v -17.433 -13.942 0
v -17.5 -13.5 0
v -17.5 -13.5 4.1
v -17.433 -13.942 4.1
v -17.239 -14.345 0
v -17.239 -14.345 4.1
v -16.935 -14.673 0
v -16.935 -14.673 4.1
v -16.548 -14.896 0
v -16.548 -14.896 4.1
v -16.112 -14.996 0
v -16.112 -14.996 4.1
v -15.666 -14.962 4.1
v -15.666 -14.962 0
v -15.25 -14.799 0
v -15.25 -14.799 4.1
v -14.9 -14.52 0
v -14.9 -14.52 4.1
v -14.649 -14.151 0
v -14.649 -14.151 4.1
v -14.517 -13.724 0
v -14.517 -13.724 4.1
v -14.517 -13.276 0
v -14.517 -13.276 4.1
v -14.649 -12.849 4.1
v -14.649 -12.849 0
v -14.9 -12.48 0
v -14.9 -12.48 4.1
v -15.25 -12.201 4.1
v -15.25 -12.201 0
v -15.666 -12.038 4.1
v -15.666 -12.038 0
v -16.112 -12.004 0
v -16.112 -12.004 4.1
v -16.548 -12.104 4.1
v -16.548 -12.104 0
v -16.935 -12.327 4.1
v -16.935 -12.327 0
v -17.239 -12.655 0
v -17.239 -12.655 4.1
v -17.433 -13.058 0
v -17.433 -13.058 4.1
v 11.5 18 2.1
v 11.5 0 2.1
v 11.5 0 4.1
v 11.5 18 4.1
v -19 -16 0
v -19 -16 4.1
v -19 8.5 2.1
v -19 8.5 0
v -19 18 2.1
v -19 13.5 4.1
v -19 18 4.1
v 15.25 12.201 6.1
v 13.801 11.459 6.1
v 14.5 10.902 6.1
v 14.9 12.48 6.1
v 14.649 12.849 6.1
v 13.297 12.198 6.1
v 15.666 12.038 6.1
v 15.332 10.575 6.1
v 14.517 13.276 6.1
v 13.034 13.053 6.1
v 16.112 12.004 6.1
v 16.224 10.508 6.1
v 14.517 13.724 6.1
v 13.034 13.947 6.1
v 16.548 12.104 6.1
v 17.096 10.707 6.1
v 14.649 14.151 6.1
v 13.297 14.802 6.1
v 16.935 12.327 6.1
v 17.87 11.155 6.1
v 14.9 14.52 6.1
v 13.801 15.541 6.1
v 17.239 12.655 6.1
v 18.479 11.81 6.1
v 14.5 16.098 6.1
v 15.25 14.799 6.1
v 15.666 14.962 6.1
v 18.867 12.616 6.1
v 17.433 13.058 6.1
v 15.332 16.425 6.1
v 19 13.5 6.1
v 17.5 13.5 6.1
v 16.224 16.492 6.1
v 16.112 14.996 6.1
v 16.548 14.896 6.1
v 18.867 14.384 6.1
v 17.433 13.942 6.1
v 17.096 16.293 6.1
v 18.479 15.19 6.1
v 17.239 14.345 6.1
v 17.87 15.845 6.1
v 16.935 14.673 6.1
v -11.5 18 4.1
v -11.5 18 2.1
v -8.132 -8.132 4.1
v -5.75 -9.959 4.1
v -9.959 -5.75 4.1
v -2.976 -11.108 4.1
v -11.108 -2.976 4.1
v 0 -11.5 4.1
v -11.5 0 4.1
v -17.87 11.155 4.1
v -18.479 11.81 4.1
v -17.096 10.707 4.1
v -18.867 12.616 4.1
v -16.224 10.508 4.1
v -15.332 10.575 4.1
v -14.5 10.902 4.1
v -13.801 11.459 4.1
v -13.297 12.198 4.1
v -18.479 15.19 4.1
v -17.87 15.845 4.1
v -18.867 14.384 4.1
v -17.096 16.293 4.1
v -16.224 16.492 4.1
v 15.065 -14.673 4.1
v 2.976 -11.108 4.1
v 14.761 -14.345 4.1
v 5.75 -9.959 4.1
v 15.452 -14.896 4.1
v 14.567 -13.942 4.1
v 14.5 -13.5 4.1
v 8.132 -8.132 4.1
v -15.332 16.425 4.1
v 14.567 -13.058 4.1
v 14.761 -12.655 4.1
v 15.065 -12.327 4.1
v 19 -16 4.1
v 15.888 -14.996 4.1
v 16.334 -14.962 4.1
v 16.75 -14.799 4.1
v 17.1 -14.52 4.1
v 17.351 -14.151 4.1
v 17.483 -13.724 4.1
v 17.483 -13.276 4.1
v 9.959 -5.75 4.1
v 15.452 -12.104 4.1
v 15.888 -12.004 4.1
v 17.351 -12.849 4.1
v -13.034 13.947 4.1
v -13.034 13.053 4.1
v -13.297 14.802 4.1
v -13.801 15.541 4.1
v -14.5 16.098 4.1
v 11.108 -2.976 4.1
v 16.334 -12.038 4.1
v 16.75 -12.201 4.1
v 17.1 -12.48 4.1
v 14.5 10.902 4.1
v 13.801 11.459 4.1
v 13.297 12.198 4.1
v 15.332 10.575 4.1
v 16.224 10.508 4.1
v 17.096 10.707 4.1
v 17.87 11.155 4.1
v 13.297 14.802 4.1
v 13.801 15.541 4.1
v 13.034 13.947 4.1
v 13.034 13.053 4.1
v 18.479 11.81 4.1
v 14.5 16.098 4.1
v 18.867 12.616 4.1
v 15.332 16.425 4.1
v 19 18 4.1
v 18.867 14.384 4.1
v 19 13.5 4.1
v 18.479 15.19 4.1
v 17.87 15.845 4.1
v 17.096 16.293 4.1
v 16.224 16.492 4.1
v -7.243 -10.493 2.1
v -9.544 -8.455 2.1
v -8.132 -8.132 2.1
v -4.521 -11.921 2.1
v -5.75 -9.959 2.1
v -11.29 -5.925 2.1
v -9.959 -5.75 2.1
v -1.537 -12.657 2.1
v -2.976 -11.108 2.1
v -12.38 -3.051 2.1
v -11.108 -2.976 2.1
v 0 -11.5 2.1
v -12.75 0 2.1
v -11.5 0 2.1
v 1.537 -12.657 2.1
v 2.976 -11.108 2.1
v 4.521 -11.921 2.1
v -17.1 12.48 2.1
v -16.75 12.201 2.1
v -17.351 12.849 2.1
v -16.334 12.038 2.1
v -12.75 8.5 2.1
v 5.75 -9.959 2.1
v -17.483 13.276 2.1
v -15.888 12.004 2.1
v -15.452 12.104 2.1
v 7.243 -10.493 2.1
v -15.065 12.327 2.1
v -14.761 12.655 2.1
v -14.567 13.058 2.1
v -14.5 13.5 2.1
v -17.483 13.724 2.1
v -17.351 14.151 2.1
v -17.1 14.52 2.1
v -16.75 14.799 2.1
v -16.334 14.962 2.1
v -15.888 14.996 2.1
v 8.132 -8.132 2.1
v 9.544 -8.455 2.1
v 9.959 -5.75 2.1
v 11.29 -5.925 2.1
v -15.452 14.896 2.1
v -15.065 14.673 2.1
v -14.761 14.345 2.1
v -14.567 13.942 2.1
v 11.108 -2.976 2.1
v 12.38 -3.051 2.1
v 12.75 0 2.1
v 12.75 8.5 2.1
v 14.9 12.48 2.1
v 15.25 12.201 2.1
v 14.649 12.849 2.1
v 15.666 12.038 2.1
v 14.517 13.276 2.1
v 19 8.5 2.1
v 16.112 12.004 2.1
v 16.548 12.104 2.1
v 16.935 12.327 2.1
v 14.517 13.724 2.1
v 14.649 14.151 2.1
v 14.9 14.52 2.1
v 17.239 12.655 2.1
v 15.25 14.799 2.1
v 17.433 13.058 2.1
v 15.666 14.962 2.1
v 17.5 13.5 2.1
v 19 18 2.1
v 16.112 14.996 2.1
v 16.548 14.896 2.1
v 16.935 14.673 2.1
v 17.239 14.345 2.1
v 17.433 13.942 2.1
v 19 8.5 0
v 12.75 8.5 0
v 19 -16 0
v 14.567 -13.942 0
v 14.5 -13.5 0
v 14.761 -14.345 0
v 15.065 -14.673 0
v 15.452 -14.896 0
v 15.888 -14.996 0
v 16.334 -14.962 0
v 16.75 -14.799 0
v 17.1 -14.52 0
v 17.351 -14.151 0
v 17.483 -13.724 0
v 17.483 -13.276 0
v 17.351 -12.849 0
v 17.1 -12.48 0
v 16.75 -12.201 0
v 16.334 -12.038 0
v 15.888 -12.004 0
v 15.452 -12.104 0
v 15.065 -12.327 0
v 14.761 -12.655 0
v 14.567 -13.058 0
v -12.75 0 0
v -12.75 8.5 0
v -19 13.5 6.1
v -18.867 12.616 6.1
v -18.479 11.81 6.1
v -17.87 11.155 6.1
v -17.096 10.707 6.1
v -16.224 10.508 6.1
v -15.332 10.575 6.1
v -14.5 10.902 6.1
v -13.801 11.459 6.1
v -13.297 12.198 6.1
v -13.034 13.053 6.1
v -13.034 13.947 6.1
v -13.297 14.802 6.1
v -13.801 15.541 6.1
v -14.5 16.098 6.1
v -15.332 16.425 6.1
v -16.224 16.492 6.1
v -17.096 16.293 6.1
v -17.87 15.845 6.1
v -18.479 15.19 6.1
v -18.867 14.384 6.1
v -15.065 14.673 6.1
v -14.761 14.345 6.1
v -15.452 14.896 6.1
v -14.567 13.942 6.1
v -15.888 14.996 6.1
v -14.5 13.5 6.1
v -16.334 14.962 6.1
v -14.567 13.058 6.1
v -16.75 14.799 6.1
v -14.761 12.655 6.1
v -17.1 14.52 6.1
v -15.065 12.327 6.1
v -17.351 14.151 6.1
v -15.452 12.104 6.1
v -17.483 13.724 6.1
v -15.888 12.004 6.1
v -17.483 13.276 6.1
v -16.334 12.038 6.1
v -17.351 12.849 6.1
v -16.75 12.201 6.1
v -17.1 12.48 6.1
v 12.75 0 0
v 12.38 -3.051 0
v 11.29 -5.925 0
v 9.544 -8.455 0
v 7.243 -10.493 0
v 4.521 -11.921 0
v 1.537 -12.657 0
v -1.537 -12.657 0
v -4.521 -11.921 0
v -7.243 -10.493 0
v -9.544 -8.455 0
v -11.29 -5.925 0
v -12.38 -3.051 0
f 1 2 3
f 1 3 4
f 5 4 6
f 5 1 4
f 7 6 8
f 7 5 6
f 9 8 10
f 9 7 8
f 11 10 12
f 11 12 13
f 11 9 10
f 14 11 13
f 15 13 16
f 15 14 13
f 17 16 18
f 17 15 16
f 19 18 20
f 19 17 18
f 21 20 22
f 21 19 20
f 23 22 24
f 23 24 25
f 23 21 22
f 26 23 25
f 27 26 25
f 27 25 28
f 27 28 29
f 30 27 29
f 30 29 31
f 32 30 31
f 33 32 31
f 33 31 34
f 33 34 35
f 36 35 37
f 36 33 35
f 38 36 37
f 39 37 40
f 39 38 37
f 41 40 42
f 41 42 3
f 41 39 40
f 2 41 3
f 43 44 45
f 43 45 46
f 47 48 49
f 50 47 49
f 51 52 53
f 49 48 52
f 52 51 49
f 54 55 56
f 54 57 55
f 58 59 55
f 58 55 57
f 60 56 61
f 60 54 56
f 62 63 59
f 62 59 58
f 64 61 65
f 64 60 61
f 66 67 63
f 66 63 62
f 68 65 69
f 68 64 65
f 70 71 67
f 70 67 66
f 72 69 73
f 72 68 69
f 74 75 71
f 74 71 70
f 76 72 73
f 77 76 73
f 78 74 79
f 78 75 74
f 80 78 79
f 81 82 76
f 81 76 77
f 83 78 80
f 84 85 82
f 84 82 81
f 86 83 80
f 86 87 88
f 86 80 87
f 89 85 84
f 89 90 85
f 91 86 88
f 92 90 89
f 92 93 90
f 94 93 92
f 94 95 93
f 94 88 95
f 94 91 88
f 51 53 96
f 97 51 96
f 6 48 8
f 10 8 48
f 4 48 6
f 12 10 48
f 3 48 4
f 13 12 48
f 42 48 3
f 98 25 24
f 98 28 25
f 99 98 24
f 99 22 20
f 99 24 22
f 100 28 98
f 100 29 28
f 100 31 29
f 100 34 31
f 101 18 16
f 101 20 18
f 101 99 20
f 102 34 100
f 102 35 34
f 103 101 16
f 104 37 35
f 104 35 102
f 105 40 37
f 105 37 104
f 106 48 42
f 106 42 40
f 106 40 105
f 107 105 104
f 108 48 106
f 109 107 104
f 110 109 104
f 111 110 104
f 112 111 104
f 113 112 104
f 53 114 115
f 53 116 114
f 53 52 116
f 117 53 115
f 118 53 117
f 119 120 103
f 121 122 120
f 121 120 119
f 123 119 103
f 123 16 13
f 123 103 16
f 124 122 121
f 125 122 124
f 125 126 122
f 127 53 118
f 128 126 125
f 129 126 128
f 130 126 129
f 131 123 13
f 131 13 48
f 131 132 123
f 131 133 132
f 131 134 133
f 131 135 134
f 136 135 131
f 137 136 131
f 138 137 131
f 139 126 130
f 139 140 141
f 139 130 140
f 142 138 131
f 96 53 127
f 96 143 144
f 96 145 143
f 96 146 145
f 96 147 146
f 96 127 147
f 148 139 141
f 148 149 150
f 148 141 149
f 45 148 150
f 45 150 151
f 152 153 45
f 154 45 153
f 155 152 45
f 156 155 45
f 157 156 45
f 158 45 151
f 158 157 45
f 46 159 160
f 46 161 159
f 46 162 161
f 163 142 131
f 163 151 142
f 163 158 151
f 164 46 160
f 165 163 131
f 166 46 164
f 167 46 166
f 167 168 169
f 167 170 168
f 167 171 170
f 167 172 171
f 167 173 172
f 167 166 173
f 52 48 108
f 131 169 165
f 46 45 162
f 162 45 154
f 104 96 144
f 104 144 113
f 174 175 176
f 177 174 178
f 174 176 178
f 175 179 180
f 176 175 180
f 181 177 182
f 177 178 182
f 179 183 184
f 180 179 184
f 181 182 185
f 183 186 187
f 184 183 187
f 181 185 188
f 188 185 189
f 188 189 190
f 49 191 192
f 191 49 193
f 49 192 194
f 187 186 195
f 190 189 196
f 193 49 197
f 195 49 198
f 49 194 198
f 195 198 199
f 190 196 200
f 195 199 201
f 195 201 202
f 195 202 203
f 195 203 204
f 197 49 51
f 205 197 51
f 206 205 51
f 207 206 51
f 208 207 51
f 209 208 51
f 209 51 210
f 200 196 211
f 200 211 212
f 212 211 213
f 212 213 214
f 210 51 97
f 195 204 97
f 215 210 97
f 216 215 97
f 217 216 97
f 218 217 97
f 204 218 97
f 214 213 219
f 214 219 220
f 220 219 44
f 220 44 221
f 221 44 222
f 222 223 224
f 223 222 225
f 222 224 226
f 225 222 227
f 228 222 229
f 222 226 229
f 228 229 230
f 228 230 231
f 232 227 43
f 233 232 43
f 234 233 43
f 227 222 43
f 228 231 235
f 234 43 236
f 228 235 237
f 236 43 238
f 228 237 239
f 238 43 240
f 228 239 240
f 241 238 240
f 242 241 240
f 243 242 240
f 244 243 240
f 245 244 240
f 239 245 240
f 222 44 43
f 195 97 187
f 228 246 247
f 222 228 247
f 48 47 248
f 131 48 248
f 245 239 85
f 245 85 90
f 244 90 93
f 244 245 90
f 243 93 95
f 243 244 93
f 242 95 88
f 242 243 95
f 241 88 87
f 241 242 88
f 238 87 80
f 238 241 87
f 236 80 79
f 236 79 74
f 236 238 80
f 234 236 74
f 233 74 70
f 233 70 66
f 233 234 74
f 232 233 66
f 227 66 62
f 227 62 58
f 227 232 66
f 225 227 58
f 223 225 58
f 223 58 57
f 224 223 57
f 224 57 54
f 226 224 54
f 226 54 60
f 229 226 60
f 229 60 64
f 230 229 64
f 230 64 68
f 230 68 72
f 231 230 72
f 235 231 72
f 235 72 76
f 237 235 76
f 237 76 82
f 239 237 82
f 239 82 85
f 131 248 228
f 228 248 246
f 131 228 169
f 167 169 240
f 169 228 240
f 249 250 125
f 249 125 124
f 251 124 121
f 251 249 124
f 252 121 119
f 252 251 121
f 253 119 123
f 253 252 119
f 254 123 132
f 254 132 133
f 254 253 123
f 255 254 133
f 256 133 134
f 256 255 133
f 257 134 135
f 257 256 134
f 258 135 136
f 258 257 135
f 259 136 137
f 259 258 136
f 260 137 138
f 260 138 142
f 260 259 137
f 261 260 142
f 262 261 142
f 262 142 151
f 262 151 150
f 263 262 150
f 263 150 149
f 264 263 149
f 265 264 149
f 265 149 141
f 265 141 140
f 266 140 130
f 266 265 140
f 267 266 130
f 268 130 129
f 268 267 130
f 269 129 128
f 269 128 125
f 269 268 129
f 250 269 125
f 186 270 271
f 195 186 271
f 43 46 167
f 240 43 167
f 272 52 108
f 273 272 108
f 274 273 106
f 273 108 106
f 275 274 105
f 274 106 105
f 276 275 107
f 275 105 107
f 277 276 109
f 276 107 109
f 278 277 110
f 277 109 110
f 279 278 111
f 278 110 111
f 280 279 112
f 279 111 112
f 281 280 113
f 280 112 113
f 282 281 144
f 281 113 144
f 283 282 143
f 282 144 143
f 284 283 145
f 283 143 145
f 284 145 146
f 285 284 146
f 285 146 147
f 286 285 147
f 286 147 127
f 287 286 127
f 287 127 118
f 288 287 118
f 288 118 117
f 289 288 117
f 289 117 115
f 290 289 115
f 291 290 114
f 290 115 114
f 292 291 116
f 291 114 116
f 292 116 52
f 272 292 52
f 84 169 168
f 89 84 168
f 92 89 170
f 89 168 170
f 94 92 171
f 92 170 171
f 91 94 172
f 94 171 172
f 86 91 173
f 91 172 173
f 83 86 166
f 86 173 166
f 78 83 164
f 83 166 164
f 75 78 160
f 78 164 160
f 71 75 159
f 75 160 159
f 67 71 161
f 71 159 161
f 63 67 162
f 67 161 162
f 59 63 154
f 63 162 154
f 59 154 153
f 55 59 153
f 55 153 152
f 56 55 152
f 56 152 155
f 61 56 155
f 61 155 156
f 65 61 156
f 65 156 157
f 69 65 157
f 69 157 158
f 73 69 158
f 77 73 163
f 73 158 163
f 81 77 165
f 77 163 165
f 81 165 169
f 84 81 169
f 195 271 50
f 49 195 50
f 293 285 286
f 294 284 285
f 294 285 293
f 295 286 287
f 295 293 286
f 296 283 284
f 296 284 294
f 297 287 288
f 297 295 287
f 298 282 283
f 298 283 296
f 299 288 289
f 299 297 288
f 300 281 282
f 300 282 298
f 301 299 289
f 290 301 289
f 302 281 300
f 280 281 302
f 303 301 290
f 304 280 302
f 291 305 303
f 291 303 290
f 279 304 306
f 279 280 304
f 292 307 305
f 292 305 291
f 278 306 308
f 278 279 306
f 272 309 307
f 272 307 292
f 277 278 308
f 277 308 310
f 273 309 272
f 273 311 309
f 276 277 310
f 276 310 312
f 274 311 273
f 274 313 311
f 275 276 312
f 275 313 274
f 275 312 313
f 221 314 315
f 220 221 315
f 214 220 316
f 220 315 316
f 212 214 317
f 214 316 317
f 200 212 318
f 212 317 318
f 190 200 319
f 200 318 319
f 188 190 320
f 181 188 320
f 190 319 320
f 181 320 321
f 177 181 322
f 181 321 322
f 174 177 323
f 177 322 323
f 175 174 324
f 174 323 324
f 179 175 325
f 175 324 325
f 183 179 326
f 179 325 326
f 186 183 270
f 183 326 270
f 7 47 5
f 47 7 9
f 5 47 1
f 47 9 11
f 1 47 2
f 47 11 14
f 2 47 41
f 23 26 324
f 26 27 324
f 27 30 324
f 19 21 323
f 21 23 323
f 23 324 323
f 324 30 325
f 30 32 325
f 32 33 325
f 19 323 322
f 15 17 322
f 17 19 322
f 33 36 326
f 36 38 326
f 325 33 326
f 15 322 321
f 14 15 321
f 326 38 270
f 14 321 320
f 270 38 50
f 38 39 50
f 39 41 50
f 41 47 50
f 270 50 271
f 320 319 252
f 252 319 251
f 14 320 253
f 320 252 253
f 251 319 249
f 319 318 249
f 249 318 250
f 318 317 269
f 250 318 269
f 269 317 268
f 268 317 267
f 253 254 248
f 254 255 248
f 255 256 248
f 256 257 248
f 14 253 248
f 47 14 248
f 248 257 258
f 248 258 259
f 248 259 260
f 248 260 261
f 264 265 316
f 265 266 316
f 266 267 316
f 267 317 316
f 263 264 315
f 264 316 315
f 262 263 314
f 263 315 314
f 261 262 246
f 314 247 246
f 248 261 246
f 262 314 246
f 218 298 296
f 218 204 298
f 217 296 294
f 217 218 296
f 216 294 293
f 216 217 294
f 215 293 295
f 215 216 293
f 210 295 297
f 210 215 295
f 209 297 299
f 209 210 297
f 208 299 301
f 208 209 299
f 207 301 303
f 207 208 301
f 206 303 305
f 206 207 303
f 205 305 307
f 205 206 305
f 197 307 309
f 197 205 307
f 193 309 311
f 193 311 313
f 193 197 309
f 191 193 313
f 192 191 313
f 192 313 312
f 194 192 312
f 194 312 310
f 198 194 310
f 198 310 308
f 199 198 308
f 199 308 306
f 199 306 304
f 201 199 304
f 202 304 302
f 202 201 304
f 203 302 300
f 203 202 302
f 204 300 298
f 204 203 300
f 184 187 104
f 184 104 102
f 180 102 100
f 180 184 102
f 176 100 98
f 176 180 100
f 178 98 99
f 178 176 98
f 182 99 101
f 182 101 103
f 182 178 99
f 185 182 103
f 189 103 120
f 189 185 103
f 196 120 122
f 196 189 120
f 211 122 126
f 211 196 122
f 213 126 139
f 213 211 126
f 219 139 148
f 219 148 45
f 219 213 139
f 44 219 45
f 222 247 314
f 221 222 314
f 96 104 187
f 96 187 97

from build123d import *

# Parameters (mm, degrees)
SKETCH_1_R          = 1.5
EXTRUDE_1_DEPTH     = 4.1
EXTRUDE_START       = -2
EXTRUDE_2_DEPTH     = 2
SKETCH_3_W          = 78.409677764
SKETCH_3_H          = 10
CUT_EXTRUDE_1_DEPTH = 2.1
SKETCH_4_W          = 7.5
SKETCH_4_H          = 2
EXTRUDE_3_DEPTH     = 2
SKETCH_5_R          = 3
SKETCH_5_R_2        = 1.5
EXTRUDE_4_DEPTH     = 2


with BuildPart() as part:
    # 草图1 → 凸台-拉伸1 (new body)
    with BuildSketch(Plane.XY):
        with BuildLine():
            Line((-12.75, 0), (-12.75, 16))
            Line((-12.75, 16), (-19, 16))
            Line((-19, 16), (-19, -16))
            Line((-19, -16), (19, -16))
            Line((19, -16), (19, 16))
            Line((19, 16), (12.75, 16))
            Line((12.75, 16), (12.75, 0))
            ThreePointArc((12.75, 0), (0, -12.75), (-12.75, 0))
        make_face()
        with Locations((-16, 13.5)):
            Circle(SKETCH_1_R, mode=Mode.SUBTRACT)
        with Locations((16, 13.5)):
            Circle(SKETCH_1_R, mode=Mode.SUBTRACT)
        with Locations(Location((16, -13.5, 0), (0, 0, 180))):
            Circle(SKETCH_1_R, mode=Mode.SUBTRACT)
        with Locations(Location((-16, -13.5, 0), (0, 0, 180))):
            Circle(SKETCH_1_R, mode=Mode.SUBTRACT)
    extrude(amount=EXTRUDE_1_DEPTH)

    # 草图2 → 凸台-拉伸2 (add)
    with BuildSketch(Plane.XY.offset(4.1).offset(EXTRUDE_START)):
        with BuildLine():
            Line((-12.75, 0), (-12.75, 16))
            Line((-12.75, 16), (-11.5, 16))
            Line((-11.5, 16), (-11.5, 0))
            ThreePointArc((-11.5, 0), (0, -11.5), (11.5, 0))
            Line((11.5, 0), (11.5, 16))
            Line((11.5, 16), (12.75, 16))
            Line((12.75, 16), (12.75, 0))
            ThreePointArc((12.75, 0), (0, -12.75), (-12.75, 0))
        make_face()
    extrude(amount=EXTRUDE_2_DEPTH)

    # 草图3 → 切除-拉伸1 (cut)
    with BuildSketch(Plane(origin=(0, 0, 0), x_dir=(-1, 0, 0), z_dir=(0, 0, -1))):
        with Locations((16, 13.5)):
            Rectangle(SKETCH_3_W, SKETCH_3_H)
    extrude(amount=-CUT_EXTRUDE_1_DEPTH, mode=Mode.SUBTRACT)

    # 草图4 → 凸台-拉伸3 (add)
    with BuildSketch(Plane.XY.offset(4.1)):
        with Locations((-15.25, 17)):
            Rectangle(SKETCH_4_W, SKETCH_4_H)
        with Locations((15.25, 17)):
            Rectangle(SKETCH_4_W, SKETCH_4_H)
    extrude(amount=-EXTRUDE_3_DEPTH)

    # 草图5 → 凸台-拉伸4 (add)
    # profile 1 of 2: a face of its own
    with BuildSketch(Plane.XY.offset(4.1)):
        with Locations(Location((-16, 13.5, 0), (0, 0, 180))):
            Circle(SKETCH_5_R)
        with Locations((-16, 13.5)):
            Circle(SKETCH_5_R_2, mode=Mode.SUBTRACT)
    # profile 2 of 2: a face of its own
    with BuildSketch(Plane.XY.offset(4.1)):
        with Locations((16, 13.5)):
            Circle(SKETCH_5_R)
        with Locations((16, 13.5)):
            Circle(SKETCH_5_R_2, mode=Mode.SUBTRACT)
    extrude(amount=EXTRUDE_4_DEPTH)


solid = part.part
